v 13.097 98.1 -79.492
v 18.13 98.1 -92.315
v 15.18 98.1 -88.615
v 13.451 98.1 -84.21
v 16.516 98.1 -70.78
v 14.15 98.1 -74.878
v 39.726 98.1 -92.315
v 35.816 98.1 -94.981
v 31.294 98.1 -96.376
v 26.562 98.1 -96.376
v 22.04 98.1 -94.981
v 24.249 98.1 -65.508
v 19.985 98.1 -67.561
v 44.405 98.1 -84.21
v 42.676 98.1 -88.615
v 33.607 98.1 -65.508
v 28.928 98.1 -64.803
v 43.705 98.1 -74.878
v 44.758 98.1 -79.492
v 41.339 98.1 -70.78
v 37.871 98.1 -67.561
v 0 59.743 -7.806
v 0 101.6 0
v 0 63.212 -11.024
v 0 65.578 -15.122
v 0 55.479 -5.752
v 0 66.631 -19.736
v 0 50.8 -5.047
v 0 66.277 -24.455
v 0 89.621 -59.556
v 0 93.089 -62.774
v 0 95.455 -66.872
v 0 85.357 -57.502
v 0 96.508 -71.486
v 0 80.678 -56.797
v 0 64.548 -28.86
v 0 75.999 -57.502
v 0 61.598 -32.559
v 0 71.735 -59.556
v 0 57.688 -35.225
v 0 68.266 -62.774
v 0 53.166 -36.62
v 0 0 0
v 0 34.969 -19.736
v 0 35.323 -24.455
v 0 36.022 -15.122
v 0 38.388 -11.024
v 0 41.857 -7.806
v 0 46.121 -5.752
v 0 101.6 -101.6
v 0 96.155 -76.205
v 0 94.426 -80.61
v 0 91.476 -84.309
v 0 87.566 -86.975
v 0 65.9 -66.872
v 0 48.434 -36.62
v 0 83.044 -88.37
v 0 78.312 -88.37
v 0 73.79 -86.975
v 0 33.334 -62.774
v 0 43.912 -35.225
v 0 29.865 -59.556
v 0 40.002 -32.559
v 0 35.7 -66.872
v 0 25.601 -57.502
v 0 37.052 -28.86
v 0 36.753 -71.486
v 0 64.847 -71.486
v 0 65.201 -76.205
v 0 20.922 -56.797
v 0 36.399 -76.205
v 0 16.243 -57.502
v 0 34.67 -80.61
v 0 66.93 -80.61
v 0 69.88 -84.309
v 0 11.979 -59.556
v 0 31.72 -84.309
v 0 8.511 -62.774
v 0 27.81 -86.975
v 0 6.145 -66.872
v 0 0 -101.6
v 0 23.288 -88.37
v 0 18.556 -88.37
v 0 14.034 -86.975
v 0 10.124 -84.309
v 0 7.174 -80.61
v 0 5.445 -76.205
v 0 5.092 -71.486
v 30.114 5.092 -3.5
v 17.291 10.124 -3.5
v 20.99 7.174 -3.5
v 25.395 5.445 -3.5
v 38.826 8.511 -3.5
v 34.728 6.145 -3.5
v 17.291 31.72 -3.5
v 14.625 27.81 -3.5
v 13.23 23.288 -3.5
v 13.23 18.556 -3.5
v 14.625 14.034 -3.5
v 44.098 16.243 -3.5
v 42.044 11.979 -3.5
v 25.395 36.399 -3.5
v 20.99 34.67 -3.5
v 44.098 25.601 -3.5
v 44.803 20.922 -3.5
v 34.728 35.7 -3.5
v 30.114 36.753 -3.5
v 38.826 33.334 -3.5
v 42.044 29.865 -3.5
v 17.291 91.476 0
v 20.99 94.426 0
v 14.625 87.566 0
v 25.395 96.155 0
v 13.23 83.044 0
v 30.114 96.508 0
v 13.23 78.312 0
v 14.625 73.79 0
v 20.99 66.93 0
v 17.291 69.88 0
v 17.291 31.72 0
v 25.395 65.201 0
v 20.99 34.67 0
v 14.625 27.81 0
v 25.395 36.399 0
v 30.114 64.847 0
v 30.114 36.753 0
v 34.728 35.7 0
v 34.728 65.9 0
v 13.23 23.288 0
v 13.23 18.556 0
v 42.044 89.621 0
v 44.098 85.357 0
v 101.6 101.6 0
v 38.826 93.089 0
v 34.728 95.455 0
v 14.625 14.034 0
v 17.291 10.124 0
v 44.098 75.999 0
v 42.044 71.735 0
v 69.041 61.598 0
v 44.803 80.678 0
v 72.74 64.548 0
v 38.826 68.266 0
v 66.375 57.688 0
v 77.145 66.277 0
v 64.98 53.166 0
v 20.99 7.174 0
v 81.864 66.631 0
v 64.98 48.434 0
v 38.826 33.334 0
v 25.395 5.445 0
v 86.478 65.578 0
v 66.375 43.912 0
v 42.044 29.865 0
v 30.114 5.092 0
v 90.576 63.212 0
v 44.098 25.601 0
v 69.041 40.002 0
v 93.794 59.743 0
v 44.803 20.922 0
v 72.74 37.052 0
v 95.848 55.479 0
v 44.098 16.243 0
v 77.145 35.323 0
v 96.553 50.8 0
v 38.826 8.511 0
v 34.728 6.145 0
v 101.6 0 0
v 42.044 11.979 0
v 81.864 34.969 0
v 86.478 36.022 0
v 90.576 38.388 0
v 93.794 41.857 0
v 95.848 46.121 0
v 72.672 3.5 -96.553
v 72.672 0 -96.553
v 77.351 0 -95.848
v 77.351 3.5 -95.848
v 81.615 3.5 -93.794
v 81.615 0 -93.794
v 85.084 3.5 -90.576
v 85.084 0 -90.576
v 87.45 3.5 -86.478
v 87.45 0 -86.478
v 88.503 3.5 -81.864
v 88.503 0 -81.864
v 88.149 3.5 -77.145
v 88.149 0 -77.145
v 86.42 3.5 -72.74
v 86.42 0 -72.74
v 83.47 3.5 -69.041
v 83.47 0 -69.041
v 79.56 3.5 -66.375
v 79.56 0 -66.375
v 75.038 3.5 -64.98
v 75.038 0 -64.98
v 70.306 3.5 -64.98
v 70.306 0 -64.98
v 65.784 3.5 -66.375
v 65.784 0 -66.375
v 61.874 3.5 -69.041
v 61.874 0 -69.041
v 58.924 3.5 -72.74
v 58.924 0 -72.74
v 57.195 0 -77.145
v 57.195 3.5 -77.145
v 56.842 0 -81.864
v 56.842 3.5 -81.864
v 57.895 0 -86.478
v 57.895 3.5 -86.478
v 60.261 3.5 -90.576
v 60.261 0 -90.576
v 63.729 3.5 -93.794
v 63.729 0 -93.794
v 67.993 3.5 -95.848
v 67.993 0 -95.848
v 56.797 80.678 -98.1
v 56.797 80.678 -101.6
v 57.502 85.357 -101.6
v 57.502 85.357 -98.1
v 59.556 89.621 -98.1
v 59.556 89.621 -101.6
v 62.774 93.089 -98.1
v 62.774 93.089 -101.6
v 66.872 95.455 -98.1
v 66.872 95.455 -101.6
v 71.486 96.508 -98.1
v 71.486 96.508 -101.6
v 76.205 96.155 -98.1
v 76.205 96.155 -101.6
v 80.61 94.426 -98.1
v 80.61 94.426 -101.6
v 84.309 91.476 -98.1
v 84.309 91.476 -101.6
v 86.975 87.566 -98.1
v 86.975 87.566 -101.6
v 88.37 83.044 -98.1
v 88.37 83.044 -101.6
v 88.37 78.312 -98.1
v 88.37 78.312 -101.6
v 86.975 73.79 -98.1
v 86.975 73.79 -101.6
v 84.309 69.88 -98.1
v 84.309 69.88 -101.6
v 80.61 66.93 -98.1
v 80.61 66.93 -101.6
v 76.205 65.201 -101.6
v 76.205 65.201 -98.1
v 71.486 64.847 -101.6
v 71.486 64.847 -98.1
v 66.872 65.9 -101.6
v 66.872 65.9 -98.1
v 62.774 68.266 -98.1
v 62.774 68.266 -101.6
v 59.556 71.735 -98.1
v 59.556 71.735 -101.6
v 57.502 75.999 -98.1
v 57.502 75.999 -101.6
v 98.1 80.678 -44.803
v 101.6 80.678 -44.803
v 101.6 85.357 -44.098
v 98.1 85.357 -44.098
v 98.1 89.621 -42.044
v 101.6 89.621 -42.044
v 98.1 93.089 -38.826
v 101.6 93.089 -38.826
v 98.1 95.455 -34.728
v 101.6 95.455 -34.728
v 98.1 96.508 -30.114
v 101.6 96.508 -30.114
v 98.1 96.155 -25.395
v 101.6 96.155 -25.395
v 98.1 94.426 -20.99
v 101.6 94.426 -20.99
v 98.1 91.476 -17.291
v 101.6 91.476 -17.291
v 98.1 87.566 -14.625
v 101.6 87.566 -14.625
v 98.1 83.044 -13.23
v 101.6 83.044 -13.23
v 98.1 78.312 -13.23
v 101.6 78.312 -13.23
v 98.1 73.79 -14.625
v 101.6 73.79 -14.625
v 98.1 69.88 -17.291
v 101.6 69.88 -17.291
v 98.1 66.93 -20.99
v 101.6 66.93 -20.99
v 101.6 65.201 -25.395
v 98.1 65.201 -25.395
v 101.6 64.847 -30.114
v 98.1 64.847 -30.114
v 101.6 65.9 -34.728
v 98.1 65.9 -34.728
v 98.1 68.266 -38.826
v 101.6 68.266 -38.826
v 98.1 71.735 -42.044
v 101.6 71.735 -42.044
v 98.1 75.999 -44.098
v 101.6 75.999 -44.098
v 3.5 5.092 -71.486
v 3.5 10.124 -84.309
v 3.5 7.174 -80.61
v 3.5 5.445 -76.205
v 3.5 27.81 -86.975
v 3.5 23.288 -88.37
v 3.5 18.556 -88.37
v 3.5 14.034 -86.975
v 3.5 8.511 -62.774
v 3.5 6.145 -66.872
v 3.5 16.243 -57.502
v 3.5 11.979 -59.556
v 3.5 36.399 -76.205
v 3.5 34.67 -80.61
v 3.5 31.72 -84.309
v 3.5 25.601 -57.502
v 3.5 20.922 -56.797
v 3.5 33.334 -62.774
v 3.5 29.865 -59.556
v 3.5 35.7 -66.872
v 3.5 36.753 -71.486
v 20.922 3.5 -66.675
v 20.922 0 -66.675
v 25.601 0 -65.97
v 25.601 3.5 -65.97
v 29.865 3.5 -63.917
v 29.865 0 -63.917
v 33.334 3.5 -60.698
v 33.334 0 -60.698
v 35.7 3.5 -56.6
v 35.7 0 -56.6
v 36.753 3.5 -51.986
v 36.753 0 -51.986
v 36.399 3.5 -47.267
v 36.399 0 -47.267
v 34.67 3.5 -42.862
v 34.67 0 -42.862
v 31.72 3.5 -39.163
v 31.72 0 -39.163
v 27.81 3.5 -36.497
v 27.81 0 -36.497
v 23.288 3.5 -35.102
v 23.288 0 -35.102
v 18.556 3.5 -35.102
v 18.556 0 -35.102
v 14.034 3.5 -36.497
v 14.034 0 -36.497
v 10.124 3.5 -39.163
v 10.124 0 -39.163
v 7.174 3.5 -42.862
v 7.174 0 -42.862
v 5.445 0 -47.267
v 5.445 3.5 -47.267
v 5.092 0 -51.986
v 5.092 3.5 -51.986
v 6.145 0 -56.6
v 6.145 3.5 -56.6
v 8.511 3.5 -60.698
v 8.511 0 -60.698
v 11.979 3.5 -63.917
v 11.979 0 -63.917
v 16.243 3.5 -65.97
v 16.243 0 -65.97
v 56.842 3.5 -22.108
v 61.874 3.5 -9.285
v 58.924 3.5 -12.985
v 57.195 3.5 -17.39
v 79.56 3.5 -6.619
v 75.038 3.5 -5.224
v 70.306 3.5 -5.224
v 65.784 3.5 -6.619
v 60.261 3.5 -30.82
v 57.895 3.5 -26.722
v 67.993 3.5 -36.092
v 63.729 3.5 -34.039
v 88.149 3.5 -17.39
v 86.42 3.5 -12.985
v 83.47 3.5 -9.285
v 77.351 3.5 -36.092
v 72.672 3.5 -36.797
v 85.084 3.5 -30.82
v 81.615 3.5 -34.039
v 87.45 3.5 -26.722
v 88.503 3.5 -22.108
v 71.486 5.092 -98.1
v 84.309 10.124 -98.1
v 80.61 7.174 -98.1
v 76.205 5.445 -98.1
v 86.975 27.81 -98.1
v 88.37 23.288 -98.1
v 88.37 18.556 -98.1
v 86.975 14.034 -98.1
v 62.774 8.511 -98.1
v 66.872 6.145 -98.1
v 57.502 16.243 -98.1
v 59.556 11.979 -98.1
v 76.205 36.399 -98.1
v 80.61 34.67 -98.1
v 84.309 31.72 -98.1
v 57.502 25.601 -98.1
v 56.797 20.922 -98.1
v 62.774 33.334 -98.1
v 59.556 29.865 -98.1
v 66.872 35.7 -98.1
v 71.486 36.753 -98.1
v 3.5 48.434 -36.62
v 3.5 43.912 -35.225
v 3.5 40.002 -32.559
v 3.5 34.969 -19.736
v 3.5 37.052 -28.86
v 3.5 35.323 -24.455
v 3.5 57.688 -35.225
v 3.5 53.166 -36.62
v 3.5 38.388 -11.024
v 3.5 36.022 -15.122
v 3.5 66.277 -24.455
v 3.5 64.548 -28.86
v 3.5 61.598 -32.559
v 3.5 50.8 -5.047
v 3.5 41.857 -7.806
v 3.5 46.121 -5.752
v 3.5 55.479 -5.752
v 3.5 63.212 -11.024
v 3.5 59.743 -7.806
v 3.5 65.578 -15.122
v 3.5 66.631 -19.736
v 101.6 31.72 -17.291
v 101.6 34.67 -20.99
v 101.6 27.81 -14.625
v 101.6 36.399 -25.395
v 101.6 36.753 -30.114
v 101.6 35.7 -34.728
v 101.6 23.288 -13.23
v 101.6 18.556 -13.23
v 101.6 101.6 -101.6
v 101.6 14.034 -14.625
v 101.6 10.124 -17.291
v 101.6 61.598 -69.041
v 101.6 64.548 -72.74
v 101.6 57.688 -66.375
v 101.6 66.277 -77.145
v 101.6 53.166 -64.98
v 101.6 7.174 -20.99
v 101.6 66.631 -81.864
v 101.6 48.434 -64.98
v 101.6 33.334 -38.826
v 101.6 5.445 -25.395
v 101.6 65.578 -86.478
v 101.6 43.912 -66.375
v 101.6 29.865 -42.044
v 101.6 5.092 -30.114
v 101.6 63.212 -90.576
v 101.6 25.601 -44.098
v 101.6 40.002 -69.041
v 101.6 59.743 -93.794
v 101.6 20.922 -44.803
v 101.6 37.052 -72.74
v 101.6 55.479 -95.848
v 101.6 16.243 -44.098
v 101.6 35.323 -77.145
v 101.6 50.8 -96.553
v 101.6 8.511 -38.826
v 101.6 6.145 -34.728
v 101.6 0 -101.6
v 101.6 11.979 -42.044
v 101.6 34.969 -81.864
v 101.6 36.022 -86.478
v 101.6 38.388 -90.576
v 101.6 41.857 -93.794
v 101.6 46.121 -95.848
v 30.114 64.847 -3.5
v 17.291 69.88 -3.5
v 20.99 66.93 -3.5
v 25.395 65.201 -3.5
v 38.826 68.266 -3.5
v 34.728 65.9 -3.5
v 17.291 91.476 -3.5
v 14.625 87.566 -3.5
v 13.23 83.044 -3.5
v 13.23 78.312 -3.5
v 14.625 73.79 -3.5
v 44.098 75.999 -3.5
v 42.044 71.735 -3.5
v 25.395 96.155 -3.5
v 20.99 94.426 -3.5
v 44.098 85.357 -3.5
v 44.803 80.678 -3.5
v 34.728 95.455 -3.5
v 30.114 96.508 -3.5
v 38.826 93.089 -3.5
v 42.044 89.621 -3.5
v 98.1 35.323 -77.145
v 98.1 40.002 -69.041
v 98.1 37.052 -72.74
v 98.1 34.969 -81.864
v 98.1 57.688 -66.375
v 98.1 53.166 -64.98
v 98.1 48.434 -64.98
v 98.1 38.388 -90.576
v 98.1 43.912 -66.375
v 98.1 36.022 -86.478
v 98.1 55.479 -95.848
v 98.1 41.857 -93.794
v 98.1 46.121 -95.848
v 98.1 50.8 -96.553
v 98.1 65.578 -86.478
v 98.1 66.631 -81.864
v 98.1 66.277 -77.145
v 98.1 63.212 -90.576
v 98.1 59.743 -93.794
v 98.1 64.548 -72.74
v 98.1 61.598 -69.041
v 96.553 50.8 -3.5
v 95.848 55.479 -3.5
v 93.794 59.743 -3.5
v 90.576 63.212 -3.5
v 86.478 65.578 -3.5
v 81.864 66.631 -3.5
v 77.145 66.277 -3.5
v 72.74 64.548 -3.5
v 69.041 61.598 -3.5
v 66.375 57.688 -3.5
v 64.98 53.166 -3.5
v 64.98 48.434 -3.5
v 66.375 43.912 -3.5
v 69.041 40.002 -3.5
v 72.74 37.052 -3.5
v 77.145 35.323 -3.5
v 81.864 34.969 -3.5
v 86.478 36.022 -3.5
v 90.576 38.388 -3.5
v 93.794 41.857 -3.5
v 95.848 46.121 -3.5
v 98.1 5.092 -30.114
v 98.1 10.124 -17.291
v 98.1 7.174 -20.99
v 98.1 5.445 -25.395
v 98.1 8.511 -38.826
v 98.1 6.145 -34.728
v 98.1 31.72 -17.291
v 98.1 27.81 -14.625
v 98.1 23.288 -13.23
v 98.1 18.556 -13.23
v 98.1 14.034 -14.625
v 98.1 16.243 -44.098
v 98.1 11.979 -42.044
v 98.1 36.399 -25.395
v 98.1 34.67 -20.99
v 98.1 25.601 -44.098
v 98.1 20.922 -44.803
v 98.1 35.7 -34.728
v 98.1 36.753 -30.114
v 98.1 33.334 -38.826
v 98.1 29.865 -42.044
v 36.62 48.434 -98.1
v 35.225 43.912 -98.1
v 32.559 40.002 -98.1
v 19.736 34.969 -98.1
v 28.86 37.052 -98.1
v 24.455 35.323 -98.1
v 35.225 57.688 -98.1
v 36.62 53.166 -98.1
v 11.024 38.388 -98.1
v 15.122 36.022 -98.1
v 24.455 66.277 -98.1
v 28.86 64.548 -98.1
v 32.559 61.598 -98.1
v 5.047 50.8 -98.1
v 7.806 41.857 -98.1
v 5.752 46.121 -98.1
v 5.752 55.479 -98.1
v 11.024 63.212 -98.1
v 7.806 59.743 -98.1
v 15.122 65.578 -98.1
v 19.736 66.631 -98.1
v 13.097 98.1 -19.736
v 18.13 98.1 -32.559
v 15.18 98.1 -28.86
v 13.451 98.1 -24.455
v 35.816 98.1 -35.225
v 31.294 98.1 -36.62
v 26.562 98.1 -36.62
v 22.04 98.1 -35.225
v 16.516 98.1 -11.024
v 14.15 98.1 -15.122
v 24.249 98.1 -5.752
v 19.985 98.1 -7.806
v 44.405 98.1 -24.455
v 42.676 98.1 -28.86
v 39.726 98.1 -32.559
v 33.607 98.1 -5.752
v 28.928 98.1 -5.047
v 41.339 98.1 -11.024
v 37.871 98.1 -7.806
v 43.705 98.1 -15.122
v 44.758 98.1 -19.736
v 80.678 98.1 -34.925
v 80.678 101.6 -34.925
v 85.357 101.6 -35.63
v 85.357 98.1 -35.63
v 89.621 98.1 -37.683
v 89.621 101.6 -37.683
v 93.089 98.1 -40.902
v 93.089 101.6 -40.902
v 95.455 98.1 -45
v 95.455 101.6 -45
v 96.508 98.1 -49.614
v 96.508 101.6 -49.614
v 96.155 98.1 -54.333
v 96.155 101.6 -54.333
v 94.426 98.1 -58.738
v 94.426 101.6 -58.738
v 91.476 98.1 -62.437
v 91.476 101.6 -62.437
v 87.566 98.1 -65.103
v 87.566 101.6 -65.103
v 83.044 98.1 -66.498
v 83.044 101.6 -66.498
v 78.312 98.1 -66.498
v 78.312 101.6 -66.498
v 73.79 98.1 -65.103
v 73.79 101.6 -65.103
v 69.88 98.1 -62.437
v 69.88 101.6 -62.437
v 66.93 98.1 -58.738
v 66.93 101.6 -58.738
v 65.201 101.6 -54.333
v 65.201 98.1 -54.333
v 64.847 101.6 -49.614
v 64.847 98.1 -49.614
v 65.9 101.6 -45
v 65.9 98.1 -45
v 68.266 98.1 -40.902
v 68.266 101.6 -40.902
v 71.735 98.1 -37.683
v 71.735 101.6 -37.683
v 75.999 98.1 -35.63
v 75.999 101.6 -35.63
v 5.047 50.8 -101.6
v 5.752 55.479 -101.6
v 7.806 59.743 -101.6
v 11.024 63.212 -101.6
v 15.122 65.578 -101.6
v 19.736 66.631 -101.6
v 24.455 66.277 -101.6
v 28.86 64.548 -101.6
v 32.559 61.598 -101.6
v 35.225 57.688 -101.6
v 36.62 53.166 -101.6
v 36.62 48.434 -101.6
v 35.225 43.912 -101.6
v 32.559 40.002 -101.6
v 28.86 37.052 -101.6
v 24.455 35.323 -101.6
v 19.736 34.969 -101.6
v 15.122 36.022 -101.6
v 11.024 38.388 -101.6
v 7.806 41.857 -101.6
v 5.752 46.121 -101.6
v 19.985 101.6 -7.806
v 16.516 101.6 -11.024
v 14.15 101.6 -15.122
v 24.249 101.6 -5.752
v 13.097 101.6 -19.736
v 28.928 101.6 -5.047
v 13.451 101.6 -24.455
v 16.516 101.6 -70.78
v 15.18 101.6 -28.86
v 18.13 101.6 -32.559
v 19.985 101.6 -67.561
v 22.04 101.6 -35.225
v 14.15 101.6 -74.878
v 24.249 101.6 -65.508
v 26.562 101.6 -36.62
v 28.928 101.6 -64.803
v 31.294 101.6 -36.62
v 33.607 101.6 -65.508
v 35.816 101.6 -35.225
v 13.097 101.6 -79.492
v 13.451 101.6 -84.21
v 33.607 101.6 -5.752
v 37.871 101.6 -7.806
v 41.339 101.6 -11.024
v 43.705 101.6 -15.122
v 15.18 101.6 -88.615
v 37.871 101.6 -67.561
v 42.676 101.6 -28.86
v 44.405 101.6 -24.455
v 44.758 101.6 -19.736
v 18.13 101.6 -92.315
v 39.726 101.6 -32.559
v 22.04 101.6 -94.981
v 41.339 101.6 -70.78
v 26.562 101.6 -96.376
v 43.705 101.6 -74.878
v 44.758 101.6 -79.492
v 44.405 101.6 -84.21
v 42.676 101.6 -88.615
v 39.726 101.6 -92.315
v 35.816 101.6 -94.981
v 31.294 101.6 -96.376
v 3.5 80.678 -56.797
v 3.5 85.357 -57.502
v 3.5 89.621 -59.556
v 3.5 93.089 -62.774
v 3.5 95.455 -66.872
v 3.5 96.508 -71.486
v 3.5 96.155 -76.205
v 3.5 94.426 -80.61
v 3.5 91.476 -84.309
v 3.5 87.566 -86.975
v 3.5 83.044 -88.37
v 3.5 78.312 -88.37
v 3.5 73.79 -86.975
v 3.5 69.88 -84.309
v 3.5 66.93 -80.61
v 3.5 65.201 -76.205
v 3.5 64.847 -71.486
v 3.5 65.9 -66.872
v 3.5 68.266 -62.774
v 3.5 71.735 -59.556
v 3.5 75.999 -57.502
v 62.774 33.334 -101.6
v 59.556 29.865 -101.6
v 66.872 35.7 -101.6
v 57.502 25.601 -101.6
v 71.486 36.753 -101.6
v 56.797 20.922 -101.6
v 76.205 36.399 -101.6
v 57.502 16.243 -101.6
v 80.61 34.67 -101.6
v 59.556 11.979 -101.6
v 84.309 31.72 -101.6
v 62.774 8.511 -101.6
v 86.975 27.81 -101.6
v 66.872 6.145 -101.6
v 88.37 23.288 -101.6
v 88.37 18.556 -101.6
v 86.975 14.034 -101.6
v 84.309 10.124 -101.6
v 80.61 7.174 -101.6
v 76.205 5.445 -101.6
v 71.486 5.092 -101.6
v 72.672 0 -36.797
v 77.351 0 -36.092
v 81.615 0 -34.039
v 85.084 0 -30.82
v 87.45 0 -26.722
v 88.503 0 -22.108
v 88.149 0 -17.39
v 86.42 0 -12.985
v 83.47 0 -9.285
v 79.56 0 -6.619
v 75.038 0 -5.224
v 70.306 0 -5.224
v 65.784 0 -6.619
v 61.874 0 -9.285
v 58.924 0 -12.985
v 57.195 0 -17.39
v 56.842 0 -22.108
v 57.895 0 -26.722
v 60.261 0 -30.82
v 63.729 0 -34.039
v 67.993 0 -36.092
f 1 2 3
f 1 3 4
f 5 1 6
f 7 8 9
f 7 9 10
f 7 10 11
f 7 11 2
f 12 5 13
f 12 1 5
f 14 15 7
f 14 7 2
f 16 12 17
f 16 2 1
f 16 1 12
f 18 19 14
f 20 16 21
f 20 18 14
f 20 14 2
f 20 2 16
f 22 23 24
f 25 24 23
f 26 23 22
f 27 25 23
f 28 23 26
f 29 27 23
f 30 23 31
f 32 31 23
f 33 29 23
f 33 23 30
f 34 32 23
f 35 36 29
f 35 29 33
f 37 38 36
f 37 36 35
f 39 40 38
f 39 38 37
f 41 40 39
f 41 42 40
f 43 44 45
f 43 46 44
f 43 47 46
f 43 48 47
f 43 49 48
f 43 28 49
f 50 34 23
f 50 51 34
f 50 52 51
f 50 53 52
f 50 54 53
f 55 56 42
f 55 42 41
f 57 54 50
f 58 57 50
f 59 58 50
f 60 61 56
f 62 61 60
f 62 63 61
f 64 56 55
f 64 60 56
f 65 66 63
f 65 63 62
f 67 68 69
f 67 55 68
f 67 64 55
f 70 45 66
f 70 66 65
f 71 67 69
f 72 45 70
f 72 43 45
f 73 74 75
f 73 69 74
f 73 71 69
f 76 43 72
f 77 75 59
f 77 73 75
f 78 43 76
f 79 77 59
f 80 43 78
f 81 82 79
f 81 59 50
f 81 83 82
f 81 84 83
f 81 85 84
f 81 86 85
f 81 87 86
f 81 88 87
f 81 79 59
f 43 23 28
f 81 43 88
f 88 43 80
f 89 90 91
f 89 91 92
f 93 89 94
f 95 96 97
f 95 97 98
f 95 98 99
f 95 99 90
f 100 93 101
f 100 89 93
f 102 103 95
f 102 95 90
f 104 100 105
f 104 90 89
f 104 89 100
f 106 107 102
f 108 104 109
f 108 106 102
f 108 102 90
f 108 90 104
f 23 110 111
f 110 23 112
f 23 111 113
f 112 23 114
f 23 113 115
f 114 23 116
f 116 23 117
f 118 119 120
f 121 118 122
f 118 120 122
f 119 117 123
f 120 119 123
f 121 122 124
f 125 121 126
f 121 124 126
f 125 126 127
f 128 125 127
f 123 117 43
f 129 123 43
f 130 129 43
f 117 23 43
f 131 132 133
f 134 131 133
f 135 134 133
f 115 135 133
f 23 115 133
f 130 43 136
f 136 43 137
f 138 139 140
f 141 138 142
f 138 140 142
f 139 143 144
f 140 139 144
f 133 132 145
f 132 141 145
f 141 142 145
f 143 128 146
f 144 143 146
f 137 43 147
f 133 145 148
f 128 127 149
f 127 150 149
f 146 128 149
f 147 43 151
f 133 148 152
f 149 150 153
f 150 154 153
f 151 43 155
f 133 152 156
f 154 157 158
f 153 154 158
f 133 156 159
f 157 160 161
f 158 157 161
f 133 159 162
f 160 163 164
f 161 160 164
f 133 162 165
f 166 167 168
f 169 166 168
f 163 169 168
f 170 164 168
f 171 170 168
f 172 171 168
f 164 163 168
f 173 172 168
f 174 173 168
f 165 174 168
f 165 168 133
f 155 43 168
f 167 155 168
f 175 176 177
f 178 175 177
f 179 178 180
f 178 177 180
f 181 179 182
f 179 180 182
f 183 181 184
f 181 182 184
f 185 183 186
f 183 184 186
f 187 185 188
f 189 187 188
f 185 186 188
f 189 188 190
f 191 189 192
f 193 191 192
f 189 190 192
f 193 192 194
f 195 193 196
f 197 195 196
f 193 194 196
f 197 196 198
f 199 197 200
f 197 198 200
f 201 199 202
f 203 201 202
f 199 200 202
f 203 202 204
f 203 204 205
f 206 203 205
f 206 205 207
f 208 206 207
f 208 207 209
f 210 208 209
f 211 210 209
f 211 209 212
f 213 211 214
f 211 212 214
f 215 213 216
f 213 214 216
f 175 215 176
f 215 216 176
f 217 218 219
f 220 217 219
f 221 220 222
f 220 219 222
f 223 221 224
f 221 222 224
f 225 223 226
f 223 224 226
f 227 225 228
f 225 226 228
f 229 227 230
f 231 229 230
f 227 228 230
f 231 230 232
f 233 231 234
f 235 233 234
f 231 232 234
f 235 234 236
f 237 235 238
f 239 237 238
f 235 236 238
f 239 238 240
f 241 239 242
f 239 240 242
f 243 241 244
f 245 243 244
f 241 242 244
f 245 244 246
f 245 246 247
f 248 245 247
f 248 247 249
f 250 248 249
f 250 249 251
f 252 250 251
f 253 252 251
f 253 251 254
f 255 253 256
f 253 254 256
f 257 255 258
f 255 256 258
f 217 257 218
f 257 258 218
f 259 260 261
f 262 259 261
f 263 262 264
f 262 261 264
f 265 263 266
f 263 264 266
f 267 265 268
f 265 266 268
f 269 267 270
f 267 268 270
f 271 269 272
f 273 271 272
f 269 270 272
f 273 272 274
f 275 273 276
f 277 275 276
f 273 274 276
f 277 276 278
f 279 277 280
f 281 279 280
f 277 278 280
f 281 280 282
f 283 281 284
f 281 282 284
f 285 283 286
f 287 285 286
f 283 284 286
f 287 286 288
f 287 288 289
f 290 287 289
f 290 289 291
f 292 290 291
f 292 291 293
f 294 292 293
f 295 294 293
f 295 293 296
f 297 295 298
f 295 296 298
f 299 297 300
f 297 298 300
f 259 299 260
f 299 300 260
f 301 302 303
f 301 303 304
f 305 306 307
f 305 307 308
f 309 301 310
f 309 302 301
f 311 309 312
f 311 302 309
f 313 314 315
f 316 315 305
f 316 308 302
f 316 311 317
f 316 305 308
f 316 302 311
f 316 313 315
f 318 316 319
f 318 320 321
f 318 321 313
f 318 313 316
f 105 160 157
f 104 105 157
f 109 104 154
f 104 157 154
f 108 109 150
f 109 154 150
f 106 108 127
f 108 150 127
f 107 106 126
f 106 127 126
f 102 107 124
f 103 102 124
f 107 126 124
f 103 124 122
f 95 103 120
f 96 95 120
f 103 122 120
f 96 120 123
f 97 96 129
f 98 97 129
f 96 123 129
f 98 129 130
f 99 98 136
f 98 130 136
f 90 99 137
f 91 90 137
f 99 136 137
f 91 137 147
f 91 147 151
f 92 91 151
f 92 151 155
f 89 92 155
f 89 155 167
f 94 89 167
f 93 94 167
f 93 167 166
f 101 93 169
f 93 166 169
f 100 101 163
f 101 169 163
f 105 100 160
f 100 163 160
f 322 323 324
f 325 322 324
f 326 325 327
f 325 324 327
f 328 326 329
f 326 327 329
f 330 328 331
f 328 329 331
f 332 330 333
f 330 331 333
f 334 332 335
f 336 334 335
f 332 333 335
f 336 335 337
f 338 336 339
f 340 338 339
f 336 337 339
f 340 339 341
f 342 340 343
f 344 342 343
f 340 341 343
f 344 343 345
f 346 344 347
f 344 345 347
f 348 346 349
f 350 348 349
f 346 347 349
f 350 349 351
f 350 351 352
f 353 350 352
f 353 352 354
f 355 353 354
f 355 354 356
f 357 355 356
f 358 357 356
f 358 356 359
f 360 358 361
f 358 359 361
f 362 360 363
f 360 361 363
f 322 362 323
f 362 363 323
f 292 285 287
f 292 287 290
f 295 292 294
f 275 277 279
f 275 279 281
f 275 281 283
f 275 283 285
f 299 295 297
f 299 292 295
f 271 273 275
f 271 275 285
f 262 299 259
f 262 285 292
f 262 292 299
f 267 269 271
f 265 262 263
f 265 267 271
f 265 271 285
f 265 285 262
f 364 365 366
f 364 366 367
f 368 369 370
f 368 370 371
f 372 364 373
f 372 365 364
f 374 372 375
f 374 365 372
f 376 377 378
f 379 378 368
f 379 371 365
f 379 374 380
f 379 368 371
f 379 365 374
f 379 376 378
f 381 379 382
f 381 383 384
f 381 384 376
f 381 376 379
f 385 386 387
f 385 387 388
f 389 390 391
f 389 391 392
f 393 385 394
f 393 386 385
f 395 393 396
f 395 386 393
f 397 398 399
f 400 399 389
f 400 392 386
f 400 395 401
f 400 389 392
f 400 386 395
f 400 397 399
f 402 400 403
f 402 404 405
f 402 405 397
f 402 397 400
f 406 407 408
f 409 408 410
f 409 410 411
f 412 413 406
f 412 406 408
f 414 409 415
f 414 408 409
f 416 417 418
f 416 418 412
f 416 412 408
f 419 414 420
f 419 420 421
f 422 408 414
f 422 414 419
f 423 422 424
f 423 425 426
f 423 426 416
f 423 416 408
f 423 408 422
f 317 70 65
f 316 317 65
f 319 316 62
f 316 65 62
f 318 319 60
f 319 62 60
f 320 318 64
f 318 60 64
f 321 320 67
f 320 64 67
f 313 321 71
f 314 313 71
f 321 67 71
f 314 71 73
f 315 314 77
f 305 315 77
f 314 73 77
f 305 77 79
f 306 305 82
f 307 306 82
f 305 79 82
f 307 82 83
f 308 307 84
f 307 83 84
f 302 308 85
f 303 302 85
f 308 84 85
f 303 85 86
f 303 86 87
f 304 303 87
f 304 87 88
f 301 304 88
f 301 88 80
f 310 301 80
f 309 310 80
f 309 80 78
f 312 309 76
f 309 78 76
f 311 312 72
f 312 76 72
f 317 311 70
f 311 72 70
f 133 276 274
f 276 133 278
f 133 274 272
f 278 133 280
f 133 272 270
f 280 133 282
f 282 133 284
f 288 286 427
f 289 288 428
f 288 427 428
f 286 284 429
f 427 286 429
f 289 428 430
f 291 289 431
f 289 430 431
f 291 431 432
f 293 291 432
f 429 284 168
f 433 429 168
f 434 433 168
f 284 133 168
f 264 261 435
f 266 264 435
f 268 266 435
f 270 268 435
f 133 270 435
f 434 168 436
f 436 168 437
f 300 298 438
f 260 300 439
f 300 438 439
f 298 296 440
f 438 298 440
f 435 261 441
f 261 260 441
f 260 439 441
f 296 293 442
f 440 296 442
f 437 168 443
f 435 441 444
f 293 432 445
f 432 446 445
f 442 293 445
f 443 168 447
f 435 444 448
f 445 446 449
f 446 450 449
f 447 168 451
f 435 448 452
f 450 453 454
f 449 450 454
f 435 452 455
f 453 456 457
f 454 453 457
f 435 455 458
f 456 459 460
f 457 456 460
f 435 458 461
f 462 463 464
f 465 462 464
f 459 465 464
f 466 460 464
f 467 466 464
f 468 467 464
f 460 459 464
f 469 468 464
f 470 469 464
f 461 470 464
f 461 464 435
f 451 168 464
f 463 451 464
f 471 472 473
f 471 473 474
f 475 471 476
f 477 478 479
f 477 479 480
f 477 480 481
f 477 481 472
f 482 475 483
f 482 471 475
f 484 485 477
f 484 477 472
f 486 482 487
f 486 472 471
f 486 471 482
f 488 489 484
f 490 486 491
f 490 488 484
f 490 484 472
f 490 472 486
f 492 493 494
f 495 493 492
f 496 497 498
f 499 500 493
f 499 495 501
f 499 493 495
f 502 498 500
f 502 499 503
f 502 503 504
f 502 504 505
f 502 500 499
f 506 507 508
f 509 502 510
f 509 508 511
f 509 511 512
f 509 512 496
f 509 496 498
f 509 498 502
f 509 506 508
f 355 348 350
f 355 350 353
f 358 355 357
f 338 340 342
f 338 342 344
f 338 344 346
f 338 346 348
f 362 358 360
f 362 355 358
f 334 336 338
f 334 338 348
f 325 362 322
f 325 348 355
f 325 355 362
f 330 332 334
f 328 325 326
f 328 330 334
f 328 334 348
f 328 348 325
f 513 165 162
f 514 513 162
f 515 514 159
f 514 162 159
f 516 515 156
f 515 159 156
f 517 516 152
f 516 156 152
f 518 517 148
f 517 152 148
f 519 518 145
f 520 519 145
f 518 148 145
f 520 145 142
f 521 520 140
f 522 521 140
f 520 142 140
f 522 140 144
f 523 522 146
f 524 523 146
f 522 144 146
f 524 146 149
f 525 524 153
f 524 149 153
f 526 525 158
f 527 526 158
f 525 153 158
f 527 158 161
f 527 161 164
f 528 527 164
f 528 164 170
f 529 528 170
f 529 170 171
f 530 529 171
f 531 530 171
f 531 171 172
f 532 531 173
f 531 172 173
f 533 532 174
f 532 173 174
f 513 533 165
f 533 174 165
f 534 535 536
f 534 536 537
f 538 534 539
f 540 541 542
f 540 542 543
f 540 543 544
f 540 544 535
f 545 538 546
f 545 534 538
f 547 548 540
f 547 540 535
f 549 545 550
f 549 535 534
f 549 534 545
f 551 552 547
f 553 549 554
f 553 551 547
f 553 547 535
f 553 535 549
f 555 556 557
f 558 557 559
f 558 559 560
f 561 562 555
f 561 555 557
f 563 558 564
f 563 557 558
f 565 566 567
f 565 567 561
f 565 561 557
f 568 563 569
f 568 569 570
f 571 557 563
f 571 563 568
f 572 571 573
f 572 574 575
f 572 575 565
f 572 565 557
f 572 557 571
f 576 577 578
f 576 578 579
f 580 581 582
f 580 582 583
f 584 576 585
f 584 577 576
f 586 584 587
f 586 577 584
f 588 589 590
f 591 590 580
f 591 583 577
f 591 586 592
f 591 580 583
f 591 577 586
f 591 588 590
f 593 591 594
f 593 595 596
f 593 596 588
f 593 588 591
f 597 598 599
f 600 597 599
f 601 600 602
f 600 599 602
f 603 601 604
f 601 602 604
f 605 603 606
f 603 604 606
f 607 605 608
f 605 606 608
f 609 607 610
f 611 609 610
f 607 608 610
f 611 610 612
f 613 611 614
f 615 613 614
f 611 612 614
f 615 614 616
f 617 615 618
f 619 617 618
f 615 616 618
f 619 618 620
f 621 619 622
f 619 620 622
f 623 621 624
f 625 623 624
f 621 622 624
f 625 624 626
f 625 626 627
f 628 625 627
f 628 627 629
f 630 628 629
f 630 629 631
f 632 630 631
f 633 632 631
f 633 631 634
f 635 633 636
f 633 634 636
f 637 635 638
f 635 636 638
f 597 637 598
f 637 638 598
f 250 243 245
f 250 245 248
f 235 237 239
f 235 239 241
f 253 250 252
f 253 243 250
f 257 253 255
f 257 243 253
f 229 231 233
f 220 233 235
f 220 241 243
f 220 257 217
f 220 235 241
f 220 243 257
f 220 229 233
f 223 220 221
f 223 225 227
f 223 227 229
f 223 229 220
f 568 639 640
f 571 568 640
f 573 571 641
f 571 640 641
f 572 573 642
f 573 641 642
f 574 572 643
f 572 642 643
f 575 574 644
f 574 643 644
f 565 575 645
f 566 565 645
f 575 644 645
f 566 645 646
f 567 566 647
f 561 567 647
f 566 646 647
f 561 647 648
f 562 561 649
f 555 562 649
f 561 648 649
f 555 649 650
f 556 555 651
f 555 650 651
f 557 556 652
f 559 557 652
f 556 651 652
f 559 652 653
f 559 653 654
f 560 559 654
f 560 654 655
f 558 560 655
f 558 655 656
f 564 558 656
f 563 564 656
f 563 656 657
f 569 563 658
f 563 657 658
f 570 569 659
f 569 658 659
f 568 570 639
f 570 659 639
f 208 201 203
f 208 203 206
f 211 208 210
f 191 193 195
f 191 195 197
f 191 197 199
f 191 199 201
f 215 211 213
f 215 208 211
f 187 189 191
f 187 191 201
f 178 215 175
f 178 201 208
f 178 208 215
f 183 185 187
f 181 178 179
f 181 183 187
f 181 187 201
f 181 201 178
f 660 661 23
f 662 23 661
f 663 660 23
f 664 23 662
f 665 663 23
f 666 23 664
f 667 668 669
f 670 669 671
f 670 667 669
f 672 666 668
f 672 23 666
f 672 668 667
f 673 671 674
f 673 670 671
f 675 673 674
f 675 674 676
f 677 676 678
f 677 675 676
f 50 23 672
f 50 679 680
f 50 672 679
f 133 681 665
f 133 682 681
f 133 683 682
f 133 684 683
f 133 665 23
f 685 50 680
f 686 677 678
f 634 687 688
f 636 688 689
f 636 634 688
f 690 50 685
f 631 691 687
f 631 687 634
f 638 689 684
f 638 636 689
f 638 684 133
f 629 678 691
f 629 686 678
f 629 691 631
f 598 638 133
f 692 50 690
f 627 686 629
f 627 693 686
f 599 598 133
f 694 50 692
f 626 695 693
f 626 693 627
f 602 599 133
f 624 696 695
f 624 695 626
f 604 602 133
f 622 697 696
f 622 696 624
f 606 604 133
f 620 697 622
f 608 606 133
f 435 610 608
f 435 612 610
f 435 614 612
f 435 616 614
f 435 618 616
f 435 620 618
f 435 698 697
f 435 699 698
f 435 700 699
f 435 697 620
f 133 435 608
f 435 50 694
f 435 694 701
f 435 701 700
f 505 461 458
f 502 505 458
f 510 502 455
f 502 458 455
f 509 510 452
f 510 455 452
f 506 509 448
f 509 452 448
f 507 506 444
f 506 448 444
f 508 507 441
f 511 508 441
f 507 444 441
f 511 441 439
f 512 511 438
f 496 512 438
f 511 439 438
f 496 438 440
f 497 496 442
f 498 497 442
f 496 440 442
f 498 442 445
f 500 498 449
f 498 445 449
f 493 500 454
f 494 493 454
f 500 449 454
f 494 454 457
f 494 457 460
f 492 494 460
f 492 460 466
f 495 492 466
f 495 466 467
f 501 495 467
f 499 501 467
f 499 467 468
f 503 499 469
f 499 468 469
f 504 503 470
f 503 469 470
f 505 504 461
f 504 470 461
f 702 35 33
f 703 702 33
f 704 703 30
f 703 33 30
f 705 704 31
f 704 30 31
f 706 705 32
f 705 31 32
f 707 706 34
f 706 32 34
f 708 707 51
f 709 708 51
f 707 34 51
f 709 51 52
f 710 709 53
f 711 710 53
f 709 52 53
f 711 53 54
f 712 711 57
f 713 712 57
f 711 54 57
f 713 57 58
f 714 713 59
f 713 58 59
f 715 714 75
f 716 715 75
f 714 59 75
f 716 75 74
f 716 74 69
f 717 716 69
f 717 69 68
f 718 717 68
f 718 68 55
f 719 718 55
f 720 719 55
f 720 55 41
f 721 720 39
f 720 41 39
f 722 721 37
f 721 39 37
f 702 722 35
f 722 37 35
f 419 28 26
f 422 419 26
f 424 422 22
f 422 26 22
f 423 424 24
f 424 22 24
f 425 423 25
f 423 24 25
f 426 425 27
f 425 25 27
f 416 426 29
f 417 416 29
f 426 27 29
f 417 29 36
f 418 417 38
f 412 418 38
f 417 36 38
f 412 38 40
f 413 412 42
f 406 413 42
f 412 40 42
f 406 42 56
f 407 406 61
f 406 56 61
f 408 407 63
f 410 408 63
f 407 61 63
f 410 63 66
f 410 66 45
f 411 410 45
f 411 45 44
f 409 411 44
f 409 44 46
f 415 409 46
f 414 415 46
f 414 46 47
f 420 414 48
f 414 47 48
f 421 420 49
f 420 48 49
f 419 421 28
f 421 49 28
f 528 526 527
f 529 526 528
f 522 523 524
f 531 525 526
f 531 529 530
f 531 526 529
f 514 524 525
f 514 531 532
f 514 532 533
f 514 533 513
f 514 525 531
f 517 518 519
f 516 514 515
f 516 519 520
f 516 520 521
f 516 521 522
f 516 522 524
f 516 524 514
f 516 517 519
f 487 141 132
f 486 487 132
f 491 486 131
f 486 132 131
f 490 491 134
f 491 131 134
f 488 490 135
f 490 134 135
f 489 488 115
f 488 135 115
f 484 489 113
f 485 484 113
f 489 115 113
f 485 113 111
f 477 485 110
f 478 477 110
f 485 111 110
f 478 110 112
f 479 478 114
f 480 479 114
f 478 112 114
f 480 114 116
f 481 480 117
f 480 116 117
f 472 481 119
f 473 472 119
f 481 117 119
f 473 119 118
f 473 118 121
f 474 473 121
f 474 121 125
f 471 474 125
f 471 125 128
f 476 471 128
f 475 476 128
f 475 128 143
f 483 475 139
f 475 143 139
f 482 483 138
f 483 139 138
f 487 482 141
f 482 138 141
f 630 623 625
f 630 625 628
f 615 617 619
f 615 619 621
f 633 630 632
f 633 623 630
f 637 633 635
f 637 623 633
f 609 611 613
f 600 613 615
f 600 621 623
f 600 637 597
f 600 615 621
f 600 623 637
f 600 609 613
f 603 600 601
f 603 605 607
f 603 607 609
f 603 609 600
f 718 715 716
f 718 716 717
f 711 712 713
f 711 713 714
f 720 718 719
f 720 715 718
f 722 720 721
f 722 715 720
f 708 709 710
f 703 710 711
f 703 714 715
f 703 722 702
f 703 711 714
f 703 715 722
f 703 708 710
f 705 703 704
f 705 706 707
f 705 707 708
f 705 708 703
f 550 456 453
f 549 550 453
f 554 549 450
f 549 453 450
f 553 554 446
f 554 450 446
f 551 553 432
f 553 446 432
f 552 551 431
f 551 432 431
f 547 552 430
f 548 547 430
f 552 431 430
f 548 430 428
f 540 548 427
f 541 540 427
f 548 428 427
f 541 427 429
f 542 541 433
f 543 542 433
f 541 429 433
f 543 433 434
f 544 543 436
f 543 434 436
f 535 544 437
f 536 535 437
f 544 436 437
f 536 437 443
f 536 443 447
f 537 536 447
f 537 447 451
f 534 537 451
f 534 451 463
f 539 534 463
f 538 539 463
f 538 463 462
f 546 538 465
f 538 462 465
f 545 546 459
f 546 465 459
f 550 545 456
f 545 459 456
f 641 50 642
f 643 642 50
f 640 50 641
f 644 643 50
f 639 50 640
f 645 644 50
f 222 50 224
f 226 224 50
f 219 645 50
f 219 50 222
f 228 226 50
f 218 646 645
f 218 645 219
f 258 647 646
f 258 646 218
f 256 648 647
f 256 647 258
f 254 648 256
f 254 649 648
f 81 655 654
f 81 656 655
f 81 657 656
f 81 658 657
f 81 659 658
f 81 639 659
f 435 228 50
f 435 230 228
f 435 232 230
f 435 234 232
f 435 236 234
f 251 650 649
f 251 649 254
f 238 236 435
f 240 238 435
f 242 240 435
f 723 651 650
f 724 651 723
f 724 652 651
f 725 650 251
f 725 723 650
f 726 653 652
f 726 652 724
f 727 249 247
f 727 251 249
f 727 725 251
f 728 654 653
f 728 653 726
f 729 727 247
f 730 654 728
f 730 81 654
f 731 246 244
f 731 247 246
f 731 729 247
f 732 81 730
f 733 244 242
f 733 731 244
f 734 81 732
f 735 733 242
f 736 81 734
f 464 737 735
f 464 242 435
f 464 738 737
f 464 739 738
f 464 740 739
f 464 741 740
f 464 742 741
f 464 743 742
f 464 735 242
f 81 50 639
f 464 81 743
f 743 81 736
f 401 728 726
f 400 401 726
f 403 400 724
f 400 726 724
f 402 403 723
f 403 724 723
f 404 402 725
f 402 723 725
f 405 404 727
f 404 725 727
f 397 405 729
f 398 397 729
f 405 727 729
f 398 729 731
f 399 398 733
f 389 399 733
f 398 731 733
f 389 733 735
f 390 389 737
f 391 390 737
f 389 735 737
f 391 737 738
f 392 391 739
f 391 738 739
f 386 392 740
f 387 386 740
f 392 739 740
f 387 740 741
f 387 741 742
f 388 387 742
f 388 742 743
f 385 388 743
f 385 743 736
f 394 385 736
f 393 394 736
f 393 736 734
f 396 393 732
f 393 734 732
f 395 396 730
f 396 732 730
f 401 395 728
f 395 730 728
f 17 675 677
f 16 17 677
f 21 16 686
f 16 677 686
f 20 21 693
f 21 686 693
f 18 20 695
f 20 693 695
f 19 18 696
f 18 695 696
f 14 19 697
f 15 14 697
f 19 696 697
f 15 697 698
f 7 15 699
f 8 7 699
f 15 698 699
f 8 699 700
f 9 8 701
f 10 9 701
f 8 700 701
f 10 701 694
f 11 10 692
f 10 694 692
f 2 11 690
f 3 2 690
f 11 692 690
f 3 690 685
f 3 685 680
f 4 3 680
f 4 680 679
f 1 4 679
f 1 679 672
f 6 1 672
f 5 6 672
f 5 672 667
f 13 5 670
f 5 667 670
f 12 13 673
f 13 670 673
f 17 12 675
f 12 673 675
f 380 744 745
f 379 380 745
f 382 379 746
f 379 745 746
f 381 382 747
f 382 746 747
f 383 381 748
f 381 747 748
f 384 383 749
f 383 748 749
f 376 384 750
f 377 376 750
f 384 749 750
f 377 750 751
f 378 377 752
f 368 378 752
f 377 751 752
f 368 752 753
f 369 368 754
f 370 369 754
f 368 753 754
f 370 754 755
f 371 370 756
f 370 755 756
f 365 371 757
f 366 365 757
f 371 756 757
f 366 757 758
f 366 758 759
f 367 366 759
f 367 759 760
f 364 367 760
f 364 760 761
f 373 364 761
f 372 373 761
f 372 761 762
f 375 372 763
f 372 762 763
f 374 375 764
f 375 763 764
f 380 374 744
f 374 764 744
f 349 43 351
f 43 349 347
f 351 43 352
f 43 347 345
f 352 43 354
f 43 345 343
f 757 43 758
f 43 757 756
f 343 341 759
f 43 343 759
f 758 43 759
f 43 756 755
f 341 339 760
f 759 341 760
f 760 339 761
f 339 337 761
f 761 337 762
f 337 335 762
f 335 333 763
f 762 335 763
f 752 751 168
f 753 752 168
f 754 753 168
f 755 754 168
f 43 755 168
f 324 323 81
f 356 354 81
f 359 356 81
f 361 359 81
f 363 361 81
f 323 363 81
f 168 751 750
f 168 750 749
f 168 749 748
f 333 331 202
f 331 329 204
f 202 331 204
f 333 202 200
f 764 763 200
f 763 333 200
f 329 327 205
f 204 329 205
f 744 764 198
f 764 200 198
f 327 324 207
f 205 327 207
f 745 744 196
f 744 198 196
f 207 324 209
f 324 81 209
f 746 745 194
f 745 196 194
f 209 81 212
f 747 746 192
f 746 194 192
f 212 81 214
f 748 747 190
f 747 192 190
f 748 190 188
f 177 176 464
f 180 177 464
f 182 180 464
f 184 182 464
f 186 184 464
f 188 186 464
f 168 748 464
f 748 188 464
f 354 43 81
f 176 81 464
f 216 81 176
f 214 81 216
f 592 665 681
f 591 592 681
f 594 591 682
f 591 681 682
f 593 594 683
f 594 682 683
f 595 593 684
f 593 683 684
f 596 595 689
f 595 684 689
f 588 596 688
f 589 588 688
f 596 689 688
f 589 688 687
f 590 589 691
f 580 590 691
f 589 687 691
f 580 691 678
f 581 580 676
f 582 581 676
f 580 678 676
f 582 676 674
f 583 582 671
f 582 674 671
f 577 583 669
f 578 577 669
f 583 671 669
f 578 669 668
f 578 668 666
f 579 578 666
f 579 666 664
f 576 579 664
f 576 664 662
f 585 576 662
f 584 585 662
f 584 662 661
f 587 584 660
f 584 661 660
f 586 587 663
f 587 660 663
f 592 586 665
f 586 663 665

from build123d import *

# Parameters (mm, degrees)
SKETCH1_W           = 101.6
SKETCH1_H           = 101.6
BOSS_EXTRUDE2_DEPTH = 101.6
SKETCH3_R           = 15.875
CUT_EXTRUDE1_DEPTH  = 3.500000112
SKETCH4_R           = 15.875
CUT_EXTRUDE2_DEPTH  = 3.500000112
SKETCH5_R           = 15.875
CUT_EXTRUDE3_DEPTH  = 3.500000112
SKETCH6_R           = 15.875
CUT_EXTRUDE4_DEPTH  = 3.500000112
SKETCH7_R           = 15.875
CUT_EXTRUDE5_DEPTH  = 3.500000112
SKETCH8_R           = 15.875
CUT_EXTRUDE6_DEPTH  = 3.500000112


with BuildPart() as part:
    # Sketch1 → Boss-Extrude2 (new body)
    with BuildSketch(Plane(origin=(0, 0, 0), x_dir=(1, 0, 0), z_dir=(0, 1, 0))):
        with Locations((50.8, 50.8)):
            Rectangle(SKETCH1_W, SKETCH1_H)
    extrude(amount=BOSS_EXTRUDE2_DEPTH)

    # Sketch3 → Cut-Extrude1 (cut)
    with BuildSketch(Plane(origin=(0, 101.6, 0), x_dir=(1, 0, 0), z_dir=(0, 1, 0))):
        with Locations(Location((28.927876431, 20.922123569, 0), (0, 0, 270))):
            Circle(SKETCH3_R)
        with Locations(Location((28.927876431, 80.677876431, 0), (0, 0, 270))):
            Circle(SKETCH3_R)
        with Locations(Location((80.677876431, 50.8, 0), (0, 0, 270))):
            Circle(SKETCH3_R)
    extrude(amount=-CUT_EXTRUDE1_DEPTH, mode=Mode.SUBTRACT)

    # Sketch4 → Cut-Extrude2 (cut)
    with BuildSketch(Plane.ZY):
        with Locations((-72.672123569, 20.922123569)):
            Circle(SKETCH4_R)
        with Locations((-72.672123569, 80.677876431)):
            Circle(SKETCH4_R)
        with Locations((-20.922123569, 50.8)):
            Circle(SKETCH4_R)
    extrude(amount=-CUT_EXTRUDE2_DEPTH, mode=Mode.SUBTRACT)

    # Sketch5 → Cut-Extrude3 (cut)
    with BuildSketch(Plane(origin=(0, 0, -101.6), x_dir=(-1, 0, 0), z_dir=(0, 0, -1))):
        with Locations((-72.672123569, 20.922123569)):
            Circle(SKETCH5_R)
        with Locations((-72.672123569, 80.677876431)):
            Circle(SKETCH5_R)
        with Locations((-20.922123569, 50.8)):
            Circle(SKETCH5_R)
    extrude(amount=-CUT_EXTRUDE3_DEPTH, mode=Mode.SUBTRACT)

    # Sketch6 → Cut-Extrude4 (cut)
    with BuildSketch(Plane(origin=(101.6, 0, 0), x_dir=(0, 0, -1), z_dir=(1, 0, 0))):
        with Locations((28.927876431, 20.922123569)):
            Circle(SKETCH6_R)
        with Locations((28.927876431, 80.677876431)):
            Circle(SKETCH6_R)
        with Locations((80.677876431, 50.8)):
            Circle(SKETCH6_R)
    extrude(amount=-CUT_EXTRUDE4_DEPTH, mode=Mode.SUBTRACT)

    # Sketch7 → Cut-Extrude5 (cut)
    with BuildSketch(Plane.XY):
        with Locations((28.927876431, 20.922123569)):
            Circle(SKETCH7_R)
        with Locations((28.927876431, 80.677876431)):
            Circle(SKETCH7_R)
        with Locations((80.677876431, 50.8)):
            Circle(SKETCH7_R)
    extrude(amount=-CUT_EXTRUDE5_DEPTH, mode=Mode.SUBTRACT)

    # Sketch8 → Cut-Extrude6 (cut)
    with BuildSketch(Plane(origin=(0, 0, 0), x_dir=(-1, 0, 0), z_dir=(0, -1, 0))):
        with Locations(Location((-72.672123569, 20.922123569, 0), (0, 0, 90))):
            Circle(SKETCH8_R)
        with Locations(Location((-72.672123569, 80.677876431, 0), (0, 0, 90))):
            Circle(SKETCH8_R)
        with Locations(Location((-20.922123569, 50.8, 0), (0, 0, 90))):
            Circle(SKETCH8_R)
    extrude(amount=-CUT_EXTRUDE6_DEPTH, mode=Mode.SUBTRACT)


solid = part.part
